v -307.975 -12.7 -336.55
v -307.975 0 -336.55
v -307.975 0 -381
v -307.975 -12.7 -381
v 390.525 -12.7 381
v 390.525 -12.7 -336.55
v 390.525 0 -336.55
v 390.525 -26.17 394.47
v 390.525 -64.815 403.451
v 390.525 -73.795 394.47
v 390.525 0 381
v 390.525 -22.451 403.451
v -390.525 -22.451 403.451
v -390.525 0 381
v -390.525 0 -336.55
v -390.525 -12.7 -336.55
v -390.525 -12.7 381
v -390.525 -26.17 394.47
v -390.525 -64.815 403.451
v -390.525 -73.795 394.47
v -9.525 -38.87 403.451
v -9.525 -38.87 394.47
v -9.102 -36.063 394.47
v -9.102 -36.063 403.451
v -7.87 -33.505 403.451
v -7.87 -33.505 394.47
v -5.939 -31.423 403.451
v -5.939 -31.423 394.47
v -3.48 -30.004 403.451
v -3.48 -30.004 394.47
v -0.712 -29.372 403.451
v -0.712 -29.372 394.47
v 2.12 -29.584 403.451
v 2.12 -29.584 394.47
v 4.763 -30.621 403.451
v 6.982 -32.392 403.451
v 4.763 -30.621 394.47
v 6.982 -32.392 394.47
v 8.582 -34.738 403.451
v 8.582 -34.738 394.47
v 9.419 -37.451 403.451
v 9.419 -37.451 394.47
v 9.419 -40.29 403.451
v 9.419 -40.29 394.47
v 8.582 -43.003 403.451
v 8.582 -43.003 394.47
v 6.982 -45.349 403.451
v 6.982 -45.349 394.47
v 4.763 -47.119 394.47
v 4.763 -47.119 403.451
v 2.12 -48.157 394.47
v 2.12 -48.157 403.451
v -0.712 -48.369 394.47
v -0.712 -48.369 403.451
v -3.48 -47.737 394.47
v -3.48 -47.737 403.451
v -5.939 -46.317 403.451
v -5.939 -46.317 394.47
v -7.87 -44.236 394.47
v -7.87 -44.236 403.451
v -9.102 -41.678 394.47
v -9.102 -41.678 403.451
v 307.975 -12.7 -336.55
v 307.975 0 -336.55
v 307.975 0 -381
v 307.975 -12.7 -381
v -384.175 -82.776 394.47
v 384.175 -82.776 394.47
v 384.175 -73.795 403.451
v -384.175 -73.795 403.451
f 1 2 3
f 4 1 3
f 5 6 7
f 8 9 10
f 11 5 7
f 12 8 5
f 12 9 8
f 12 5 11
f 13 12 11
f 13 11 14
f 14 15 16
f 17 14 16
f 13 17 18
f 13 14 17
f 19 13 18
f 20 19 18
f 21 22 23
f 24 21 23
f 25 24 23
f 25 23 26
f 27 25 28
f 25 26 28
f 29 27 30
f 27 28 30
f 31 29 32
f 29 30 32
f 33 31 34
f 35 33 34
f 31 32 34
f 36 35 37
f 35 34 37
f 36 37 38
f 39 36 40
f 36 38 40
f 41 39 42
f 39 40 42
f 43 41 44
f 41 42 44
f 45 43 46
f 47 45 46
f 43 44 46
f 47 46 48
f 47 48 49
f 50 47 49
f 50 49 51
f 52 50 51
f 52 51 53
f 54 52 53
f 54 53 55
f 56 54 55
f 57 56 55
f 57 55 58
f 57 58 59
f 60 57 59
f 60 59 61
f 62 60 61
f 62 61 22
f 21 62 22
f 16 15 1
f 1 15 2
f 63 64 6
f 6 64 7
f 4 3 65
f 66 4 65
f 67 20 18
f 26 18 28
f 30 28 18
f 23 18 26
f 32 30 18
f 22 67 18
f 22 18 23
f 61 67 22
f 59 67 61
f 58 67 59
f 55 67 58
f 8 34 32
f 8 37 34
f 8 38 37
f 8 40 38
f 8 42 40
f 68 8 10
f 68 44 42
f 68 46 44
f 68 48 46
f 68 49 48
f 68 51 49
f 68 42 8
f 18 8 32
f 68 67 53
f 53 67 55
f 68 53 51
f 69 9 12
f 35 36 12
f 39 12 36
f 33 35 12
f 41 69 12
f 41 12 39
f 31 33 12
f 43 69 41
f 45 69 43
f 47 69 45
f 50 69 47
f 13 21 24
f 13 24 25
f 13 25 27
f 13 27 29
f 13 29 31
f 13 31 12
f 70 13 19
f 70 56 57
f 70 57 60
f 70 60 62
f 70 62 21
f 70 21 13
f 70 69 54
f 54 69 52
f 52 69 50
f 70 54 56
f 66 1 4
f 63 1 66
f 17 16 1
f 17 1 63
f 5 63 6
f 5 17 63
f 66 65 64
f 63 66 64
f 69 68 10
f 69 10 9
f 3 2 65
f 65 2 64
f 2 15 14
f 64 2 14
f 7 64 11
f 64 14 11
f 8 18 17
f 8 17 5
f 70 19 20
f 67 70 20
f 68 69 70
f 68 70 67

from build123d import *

# Parameters (mm, degrees)
F1_DEPTH   = 12.7
F1_FACE1_W = 781.05
F1_FACE1_H = 12.7
F4_SIZE    = 6.35
F6_D       = 19.05
F6_DEPTH   = 1524
F6_TIP     = 5.7231973962


with BuildPart() as f1:
    # F0 (on Front) → F1 (new body)
    with BuildSketch(Plane.XZ):
        Polygon((-307.975, -336.55), (-307.975, -381), (307.975, -381), (307.975, -336.55), (390.525, -336.55), (390.525, 381), (-390.525, 381), (-390.525, -336.55), align=None)
    extrude(amount=F1_DEPTH)

    # F3: sweep along a path in F2
    with BuildLine(Plane(origin=(-390.525, 0, 0), x_dir=(0, -1, 0), z_dir=(-1, 0, 0))) as f3_path:
        Line((6.35, 381), (24.3105122421, 398.9605122421))
        Line((24.3105122421, 398.9605122421), (78.2855122421, 398.9605122421))
    # F1_face1 (on face) → F3 (sweep)
    with BuildSketch(Plane(origin=(0, -6.35, 381), x_dir=(1, 0, 0), z_dir=(0, 0, 1))):
        Rectangle(F1_FACE1_W, F1_FACE1_H)
    sweep(path=f3_path.line, transition=Transition.RIGHT)

    # F4
    f4_edges = [f1.edges().sort_by_distance(p)[0] for p in [
        (-390.525, -78.285512, 398.960512),
        (390.525, -78.285512, 398.960512),
    ]]
    chamfer(f4_edges, length=F4_SIZE)

    # F6
    with Locations(Plane.XY.offset(403.4506403027)):
        with Locations((0, -38.8703841816)):
            Hole(F6_D / 2, depth=F6_DEPTH)
            with Locations((0, 0, -(F6_DEPTH + F6_TIP / 2))):  # 118° drill point
                Cone(0, F6_D / 2, F6_TIP, mode=Mode.SUBTRACT)


solid = f1.part
